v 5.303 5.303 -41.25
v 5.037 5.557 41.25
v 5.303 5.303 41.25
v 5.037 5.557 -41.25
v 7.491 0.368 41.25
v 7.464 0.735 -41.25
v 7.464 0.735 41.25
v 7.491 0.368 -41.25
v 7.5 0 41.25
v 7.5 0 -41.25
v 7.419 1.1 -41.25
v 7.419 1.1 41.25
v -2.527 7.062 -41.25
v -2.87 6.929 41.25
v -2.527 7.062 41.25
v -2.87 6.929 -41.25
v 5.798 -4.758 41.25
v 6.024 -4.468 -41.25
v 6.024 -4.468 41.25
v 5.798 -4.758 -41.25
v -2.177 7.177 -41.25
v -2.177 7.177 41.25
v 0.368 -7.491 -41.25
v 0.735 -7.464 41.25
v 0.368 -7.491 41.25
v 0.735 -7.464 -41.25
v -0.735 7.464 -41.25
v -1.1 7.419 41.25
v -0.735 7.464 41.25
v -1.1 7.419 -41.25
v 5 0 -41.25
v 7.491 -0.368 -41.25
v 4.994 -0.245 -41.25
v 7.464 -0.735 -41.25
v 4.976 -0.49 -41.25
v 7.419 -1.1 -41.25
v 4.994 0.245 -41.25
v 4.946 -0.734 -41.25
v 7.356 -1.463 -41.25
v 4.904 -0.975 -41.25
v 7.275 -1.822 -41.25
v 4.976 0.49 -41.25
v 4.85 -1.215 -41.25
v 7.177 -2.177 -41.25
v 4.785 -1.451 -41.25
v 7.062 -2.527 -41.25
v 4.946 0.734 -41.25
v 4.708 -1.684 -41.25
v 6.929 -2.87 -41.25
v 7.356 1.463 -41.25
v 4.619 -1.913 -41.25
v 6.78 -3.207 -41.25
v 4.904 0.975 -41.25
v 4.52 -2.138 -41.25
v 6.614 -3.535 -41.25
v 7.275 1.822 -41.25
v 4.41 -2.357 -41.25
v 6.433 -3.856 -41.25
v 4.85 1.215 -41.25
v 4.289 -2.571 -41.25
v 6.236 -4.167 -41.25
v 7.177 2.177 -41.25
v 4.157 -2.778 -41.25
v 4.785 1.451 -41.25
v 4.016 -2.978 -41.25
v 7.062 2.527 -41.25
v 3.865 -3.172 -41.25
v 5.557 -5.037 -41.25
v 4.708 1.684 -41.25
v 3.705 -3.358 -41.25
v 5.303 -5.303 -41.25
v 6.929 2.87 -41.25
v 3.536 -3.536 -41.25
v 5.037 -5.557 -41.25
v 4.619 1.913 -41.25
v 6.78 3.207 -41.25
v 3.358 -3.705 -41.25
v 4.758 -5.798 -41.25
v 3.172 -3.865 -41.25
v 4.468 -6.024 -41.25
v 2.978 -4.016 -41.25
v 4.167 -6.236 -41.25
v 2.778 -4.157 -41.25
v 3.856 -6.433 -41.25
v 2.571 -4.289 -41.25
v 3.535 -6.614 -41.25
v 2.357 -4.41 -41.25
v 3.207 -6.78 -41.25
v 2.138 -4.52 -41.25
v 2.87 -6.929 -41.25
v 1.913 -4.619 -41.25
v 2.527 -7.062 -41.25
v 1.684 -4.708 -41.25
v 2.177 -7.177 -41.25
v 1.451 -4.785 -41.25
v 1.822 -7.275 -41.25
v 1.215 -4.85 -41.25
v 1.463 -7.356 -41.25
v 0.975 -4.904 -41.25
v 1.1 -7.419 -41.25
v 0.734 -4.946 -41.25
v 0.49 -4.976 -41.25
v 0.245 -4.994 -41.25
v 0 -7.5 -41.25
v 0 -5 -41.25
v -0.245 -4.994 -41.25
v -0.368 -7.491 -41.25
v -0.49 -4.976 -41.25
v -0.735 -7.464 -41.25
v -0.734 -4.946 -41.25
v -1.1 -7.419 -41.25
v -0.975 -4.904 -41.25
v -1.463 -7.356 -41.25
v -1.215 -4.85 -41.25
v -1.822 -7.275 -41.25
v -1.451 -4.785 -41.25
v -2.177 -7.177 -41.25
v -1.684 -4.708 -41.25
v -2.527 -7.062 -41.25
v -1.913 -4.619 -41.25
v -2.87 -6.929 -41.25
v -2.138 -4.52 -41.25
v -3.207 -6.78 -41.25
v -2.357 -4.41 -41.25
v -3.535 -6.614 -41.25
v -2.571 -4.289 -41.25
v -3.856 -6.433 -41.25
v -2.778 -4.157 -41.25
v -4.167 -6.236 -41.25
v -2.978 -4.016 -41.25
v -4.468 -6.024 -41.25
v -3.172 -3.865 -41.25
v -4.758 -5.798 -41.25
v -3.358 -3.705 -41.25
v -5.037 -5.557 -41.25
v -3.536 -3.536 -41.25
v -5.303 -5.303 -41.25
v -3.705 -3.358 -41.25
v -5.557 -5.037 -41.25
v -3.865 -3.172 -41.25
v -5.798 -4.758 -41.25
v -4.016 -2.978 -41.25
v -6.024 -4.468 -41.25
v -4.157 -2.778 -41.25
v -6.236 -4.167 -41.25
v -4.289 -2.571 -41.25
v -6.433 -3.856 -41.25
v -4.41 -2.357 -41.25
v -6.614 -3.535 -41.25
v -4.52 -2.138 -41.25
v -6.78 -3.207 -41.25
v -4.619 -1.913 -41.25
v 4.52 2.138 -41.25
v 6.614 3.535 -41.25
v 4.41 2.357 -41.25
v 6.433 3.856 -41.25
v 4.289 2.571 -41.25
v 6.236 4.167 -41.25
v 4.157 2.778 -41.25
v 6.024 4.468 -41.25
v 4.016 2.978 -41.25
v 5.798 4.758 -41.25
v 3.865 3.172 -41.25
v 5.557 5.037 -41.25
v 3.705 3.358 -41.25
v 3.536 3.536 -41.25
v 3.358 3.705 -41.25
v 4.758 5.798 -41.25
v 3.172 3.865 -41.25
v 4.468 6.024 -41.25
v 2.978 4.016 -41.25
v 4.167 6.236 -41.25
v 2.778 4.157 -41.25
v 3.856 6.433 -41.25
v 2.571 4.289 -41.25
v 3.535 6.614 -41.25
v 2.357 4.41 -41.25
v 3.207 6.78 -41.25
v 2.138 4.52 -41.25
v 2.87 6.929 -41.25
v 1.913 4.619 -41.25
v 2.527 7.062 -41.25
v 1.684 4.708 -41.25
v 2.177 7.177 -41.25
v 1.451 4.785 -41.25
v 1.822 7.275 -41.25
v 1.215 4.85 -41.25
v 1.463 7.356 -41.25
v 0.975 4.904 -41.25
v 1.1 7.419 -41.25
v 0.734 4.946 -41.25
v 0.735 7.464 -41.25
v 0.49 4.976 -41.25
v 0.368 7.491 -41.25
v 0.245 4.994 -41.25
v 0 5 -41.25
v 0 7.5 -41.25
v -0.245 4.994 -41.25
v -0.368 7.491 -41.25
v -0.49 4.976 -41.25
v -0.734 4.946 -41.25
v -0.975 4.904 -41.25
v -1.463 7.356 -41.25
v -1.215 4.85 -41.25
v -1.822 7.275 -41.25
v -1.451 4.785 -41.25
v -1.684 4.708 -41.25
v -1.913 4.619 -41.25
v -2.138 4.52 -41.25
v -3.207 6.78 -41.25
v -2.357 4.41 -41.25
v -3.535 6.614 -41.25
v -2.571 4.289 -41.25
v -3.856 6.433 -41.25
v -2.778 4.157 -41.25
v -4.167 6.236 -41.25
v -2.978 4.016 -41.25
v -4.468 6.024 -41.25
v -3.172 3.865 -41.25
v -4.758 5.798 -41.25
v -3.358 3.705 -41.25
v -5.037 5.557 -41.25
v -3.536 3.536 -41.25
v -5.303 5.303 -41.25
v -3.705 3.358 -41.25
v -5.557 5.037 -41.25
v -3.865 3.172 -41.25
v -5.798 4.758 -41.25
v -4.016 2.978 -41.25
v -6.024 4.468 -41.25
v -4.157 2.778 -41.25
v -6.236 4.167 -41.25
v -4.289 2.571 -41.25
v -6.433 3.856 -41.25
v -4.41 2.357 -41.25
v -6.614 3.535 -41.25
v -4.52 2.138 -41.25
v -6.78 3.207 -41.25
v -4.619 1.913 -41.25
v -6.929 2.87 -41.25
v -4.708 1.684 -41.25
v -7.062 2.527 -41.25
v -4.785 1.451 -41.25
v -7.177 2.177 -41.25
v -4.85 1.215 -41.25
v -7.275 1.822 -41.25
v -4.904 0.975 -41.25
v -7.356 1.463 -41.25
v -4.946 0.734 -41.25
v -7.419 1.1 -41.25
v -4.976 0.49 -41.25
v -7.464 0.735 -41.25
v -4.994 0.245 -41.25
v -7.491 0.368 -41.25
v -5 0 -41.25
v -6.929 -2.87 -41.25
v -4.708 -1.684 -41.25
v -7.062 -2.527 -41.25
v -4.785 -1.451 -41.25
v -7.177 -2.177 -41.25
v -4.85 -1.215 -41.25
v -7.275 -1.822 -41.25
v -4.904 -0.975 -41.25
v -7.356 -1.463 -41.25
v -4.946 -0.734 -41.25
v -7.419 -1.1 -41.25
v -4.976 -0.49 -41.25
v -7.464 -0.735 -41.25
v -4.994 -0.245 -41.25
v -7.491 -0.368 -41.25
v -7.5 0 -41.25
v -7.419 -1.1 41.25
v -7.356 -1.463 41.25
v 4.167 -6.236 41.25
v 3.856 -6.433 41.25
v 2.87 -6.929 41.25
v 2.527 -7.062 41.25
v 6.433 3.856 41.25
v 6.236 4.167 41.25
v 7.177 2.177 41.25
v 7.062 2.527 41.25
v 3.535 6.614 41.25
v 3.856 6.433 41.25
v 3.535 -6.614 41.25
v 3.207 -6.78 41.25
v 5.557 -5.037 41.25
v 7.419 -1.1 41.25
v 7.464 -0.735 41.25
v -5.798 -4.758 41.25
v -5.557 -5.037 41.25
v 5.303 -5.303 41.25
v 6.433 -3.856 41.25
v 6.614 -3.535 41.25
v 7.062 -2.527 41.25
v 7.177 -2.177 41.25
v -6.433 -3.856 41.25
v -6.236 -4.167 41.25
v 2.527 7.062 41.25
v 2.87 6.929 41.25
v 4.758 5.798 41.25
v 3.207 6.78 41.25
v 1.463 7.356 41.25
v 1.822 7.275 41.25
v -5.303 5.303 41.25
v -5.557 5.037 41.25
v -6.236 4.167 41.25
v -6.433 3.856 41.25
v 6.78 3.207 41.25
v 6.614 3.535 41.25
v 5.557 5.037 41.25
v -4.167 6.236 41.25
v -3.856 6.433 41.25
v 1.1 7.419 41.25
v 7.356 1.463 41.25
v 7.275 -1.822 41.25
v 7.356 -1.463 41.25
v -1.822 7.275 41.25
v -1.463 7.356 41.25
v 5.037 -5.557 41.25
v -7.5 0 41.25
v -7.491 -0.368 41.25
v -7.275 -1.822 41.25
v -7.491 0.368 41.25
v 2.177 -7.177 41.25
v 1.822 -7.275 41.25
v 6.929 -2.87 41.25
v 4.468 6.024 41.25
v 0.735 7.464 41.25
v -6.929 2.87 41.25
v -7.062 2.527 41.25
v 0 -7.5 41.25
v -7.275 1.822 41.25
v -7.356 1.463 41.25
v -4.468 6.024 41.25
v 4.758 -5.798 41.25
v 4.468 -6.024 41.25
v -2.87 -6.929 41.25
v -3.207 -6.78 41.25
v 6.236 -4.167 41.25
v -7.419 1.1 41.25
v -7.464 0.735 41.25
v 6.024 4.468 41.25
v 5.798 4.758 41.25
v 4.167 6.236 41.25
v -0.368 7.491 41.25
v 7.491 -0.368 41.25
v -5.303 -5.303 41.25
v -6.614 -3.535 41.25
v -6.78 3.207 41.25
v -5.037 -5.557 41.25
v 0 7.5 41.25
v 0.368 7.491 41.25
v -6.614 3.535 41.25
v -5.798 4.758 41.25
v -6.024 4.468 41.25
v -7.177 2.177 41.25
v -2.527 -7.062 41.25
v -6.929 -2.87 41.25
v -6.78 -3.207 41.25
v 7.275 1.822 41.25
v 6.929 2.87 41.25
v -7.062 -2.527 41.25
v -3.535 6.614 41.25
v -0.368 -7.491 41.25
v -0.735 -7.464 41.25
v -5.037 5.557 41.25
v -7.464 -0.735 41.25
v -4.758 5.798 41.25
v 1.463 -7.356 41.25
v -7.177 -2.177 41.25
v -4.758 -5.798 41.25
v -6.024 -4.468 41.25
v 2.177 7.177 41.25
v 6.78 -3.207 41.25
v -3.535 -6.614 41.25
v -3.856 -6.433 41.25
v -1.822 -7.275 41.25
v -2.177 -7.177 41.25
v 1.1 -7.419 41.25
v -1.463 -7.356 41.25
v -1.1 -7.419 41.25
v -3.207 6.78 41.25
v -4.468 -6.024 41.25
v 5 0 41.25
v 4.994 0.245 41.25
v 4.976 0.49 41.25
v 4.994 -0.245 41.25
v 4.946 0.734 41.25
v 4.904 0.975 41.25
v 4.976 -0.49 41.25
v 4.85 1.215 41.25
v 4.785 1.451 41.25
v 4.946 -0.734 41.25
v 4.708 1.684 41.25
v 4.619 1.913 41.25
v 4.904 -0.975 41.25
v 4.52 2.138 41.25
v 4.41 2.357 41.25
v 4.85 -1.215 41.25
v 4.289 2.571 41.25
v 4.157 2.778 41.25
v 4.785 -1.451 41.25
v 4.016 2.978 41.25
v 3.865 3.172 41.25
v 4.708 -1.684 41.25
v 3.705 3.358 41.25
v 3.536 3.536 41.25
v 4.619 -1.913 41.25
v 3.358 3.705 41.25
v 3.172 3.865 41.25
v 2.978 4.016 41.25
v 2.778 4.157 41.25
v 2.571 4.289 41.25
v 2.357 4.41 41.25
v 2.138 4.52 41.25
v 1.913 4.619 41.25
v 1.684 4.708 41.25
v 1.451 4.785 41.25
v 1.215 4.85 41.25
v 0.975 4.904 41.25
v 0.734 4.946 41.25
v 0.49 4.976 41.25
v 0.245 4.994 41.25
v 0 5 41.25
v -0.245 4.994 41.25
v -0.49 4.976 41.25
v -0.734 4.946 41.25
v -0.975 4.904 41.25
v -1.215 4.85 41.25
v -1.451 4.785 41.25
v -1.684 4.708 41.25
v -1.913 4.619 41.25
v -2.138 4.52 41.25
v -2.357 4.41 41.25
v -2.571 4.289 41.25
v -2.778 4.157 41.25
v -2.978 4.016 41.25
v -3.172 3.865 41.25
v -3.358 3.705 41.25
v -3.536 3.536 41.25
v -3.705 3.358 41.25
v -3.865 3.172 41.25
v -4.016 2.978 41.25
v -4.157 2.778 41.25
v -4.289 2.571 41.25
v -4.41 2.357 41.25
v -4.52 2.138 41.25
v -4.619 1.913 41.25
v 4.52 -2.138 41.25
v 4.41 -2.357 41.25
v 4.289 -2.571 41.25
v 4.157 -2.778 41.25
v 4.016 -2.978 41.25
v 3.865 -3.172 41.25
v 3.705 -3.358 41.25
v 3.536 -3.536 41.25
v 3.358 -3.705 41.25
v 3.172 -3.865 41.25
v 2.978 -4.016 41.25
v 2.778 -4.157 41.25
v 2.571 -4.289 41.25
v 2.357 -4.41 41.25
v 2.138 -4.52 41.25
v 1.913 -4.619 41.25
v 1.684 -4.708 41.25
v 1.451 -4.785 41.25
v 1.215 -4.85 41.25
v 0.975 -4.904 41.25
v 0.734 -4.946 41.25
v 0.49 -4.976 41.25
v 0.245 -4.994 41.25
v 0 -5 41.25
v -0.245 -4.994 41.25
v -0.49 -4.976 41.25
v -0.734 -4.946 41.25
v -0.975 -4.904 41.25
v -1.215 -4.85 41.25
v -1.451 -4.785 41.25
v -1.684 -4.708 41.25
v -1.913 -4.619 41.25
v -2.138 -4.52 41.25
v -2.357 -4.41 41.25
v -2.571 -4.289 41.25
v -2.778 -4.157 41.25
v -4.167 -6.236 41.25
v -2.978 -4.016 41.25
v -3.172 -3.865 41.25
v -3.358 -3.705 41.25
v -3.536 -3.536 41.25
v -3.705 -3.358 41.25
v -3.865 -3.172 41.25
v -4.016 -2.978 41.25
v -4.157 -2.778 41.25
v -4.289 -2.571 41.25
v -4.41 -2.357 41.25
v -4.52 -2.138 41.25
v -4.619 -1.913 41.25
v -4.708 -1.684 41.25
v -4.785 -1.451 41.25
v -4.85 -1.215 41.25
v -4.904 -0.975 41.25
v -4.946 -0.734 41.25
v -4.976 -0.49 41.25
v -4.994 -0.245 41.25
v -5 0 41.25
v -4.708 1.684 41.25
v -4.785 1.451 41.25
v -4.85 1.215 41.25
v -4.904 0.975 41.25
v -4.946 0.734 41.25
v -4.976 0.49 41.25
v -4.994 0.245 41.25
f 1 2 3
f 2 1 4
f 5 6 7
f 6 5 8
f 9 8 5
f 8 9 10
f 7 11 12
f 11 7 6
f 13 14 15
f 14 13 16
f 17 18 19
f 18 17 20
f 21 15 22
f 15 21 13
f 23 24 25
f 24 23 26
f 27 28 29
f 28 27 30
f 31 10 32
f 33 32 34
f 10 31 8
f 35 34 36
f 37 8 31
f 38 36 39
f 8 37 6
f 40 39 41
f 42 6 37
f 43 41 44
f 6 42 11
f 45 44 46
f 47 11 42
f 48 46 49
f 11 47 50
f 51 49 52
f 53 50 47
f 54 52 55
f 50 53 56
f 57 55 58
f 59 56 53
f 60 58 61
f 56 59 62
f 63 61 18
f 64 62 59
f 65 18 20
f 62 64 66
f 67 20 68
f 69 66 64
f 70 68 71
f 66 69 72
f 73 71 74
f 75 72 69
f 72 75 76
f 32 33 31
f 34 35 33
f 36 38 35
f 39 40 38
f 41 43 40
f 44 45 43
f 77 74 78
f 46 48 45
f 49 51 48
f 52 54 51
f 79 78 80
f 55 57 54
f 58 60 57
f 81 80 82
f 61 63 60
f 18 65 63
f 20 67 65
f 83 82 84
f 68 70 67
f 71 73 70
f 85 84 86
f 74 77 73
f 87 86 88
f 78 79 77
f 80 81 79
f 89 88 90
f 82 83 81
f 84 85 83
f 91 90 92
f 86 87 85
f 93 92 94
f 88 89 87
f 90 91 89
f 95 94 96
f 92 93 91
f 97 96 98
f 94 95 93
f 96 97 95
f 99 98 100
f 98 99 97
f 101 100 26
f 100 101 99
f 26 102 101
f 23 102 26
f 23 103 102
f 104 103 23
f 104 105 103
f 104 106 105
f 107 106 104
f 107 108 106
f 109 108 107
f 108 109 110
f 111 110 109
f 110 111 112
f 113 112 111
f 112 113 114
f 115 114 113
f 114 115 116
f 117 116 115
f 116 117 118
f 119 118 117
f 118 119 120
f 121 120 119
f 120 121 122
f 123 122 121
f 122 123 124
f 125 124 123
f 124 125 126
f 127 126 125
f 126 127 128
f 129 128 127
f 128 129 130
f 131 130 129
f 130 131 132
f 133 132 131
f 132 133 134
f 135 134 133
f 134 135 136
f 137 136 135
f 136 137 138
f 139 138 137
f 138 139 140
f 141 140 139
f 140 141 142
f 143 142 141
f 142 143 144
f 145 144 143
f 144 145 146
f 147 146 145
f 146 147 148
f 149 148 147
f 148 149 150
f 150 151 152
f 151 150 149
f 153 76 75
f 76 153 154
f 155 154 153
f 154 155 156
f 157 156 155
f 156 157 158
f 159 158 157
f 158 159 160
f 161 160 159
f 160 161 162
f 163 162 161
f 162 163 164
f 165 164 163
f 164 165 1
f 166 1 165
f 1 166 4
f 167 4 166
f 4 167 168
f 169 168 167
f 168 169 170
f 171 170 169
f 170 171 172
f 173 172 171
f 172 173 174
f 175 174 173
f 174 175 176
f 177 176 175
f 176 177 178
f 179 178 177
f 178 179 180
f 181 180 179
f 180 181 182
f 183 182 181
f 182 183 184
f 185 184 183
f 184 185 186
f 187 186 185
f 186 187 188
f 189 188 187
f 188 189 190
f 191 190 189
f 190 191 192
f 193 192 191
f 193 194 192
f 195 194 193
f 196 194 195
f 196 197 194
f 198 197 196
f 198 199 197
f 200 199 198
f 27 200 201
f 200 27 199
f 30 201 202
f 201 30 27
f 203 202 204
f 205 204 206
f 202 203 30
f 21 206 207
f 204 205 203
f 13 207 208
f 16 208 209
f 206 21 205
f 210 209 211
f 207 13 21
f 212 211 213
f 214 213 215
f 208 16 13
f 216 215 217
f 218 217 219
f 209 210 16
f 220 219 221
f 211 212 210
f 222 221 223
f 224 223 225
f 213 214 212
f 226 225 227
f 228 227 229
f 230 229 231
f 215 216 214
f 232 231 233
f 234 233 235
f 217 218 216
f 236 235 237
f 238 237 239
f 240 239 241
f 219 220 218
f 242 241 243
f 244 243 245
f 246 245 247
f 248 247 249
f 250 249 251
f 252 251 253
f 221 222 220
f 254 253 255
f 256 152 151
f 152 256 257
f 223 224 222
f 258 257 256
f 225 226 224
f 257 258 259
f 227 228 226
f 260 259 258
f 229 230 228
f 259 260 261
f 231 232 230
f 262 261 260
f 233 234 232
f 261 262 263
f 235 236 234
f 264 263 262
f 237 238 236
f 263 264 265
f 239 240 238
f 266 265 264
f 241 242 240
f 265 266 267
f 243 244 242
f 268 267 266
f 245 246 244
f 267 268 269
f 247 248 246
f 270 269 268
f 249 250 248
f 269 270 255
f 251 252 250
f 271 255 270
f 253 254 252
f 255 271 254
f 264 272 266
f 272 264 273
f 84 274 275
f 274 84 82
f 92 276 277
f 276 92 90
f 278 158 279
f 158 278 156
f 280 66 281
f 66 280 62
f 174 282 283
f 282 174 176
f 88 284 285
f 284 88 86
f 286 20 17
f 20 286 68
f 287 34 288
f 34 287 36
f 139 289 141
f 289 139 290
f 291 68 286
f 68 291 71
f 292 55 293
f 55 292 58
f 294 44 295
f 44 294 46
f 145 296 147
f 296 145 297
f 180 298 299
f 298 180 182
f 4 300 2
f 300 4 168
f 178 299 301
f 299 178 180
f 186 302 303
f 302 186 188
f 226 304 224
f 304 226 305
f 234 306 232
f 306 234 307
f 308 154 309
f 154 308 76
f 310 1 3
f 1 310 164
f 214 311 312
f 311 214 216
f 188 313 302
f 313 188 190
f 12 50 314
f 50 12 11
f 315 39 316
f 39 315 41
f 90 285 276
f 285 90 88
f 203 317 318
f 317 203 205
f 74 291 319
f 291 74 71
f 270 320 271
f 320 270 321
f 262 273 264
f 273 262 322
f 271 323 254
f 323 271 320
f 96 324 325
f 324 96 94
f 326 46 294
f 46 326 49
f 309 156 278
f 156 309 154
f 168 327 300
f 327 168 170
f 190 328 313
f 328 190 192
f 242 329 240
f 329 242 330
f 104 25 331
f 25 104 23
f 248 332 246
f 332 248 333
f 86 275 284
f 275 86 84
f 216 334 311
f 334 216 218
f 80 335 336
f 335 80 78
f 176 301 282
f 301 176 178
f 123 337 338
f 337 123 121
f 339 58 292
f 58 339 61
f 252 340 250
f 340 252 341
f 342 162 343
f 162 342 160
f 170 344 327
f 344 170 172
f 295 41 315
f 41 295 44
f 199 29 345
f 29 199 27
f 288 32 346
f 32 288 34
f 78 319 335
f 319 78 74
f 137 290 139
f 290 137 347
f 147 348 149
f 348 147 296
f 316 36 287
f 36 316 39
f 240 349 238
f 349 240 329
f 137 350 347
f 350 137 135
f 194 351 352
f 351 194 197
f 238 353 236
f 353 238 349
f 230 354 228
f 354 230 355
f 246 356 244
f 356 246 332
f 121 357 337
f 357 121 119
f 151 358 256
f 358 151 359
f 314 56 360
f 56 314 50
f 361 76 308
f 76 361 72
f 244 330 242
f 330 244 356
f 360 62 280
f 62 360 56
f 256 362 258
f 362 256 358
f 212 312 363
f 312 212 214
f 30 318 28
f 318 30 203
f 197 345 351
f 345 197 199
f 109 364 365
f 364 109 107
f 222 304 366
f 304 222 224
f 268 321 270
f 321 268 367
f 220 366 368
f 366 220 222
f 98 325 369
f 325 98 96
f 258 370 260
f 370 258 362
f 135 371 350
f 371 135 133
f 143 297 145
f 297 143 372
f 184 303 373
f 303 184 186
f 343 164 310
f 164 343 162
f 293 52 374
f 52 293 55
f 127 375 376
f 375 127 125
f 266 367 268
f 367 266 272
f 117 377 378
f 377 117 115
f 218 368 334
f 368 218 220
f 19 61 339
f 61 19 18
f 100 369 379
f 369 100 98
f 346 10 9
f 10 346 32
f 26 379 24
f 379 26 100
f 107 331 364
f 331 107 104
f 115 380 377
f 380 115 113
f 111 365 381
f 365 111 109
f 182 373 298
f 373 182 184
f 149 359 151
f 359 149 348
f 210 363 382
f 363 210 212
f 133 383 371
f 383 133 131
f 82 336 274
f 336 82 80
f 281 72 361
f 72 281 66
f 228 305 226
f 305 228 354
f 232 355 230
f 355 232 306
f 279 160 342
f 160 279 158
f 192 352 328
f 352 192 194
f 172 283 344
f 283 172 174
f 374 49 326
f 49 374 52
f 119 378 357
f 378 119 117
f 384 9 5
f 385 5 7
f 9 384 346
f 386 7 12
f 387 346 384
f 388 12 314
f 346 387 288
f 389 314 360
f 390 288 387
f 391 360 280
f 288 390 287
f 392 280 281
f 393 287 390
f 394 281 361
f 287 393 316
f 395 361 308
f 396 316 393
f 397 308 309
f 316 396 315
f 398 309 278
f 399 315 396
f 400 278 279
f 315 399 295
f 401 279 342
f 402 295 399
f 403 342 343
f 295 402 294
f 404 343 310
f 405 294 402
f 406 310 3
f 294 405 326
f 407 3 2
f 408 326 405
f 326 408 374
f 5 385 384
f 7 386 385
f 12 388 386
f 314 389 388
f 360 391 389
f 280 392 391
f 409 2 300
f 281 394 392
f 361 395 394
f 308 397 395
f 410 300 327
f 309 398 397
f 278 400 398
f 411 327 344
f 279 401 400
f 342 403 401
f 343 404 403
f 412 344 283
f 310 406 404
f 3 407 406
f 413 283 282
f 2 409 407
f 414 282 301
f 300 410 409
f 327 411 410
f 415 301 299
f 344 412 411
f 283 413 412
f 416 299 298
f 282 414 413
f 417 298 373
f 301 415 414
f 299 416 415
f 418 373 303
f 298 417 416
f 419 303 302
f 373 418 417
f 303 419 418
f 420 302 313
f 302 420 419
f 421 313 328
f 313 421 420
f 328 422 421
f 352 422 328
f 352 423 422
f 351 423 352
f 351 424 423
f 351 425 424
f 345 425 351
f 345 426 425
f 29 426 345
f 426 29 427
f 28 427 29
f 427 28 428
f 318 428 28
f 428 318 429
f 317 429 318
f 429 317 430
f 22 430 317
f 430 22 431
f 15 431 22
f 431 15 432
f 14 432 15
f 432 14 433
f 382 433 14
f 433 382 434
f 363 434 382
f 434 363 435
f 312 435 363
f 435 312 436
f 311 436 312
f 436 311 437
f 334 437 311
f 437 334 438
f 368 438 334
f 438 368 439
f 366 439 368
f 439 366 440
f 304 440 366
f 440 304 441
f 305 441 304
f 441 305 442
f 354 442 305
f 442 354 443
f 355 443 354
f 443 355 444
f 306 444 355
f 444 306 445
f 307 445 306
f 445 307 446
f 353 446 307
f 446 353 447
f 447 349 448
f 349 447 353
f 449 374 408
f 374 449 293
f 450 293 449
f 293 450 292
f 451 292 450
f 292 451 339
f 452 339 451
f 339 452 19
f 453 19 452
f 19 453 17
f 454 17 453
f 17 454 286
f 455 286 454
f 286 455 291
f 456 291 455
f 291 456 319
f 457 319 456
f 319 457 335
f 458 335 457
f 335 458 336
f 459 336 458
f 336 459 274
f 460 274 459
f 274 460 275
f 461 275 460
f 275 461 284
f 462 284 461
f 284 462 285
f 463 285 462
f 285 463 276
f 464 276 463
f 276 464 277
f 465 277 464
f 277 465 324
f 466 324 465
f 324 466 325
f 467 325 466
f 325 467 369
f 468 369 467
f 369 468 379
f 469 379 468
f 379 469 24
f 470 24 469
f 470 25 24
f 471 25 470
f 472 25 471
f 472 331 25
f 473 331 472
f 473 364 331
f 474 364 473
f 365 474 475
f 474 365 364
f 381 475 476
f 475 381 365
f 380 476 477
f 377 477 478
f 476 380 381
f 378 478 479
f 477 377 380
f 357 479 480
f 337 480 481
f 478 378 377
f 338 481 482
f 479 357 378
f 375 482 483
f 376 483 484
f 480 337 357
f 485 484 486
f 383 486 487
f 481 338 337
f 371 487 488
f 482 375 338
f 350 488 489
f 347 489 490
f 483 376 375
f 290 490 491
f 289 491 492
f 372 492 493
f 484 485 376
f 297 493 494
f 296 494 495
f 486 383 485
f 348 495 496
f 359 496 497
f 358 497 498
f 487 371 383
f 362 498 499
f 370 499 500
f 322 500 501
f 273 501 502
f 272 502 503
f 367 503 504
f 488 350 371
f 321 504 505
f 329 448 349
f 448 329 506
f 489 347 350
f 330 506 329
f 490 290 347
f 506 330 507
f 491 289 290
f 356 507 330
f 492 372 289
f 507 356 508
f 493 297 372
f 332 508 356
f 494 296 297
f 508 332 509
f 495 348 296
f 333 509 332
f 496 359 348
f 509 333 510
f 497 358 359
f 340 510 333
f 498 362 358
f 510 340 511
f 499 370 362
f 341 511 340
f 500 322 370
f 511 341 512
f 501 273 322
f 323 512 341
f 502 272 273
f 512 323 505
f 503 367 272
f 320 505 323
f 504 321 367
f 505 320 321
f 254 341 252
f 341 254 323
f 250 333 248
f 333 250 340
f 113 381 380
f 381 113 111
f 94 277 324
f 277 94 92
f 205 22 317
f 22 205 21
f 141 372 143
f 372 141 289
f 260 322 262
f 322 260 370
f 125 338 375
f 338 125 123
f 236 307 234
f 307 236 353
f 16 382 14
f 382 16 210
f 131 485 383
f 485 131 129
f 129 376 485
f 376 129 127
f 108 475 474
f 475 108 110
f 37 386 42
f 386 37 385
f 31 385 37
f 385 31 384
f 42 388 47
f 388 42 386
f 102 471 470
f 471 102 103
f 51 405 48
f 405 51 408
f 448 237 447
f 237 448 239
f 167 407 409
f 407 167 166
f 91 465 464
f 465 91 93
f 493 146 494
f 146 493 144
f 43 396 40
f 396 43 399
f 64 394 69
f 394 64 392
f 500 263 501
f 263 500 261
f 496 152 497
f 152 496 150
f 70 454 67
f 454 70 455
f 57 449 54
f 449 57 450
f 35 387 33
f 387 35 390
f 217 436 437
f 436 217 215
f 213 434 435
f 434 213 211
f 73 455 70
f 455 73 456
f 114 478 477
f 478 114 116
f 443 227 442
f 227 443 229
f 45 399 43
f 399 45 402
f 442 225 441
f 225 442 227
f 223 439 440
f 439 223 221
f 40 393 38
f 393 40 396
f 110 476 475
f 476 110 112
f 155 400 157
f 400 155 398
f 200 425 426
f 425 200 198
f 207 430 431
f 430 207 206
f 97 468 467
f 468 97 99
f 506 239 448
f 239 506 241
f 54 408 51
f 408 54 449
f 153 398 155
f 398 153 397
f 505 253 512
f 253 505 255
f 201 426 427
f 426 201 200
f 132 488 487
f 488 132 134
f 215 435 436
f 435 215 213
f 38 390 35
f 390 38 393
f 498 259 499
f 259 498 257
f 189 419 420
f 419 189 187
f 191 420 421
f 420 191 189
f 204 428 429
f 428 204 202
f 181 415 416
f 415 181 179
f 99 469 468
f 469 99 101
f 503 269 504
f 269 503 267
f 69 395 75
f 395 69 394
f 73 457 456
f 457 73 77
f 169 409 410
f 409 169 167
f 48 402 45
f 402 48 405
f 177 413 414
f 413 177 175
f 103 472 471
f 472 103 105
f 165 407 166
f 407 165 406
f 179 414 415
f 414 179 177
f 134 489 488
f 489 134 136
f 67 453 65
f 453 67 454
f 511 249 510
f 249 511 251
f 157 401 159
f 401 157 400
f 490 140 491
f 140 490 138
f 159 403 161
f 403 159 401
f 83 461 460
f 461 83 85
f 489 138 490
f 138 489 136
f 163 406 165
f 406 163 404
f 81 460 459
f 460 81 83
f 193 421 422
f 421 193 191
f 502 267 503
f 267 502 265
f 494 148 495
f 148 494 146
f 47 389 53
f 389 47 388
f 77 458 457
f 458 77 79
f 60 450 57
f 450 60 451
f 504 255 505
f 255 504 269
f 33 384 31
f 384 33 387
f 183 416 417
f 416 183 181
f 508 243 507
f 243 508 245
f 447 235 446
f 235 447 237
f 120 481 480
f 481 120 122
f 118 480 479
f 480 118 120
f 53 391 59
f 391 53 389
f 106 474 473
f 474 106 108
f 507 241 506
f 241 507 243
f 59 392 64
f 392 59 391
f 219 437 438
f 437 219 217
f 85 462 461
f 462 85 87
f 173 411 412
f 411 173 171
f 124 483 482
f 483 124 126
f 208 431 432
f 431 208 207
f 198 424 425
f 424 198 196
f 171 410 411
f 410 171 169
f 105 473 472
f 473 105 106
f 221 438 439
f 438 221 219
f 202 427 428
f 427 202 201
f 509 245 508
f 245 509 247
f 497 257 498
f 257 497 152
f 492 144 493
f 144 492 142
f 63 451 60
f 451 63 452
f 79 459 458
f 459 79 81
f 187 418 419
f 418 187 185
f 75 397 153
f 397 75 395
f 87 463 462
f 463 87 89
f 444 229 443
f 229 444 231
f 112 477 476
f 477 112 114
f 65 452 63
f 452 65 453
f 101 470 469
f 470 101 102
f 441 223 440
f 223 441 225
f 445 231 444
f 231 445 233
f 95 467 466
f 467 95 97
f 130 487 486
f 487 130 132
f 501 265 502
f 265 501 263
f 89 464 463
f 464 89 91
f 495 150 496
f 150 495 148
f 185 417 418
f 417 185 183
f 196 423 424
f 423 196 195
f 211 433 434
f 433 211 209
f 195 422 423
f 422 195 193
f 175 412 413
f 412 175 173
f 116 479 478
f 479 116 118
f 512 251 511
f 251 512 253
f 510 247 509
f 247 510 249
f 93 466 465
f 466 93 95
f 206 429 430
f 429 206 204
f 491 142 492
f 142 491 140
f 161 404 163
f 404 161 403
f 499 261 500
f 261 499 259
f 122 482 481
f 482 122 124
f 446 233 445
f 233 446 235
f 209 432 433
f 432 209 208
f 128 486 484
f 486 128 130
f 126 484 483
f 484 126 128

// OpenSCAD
$fn=128;

od = 15.0;
id = 10.0;
h  = 82.5;

module tube(od, id, h) {
    difference() {
        cylinder(h=h, d=od, center=true);
        cylinder(h=h+0.2, d=id, center=true);
    }
}

tube(od, id, h);
